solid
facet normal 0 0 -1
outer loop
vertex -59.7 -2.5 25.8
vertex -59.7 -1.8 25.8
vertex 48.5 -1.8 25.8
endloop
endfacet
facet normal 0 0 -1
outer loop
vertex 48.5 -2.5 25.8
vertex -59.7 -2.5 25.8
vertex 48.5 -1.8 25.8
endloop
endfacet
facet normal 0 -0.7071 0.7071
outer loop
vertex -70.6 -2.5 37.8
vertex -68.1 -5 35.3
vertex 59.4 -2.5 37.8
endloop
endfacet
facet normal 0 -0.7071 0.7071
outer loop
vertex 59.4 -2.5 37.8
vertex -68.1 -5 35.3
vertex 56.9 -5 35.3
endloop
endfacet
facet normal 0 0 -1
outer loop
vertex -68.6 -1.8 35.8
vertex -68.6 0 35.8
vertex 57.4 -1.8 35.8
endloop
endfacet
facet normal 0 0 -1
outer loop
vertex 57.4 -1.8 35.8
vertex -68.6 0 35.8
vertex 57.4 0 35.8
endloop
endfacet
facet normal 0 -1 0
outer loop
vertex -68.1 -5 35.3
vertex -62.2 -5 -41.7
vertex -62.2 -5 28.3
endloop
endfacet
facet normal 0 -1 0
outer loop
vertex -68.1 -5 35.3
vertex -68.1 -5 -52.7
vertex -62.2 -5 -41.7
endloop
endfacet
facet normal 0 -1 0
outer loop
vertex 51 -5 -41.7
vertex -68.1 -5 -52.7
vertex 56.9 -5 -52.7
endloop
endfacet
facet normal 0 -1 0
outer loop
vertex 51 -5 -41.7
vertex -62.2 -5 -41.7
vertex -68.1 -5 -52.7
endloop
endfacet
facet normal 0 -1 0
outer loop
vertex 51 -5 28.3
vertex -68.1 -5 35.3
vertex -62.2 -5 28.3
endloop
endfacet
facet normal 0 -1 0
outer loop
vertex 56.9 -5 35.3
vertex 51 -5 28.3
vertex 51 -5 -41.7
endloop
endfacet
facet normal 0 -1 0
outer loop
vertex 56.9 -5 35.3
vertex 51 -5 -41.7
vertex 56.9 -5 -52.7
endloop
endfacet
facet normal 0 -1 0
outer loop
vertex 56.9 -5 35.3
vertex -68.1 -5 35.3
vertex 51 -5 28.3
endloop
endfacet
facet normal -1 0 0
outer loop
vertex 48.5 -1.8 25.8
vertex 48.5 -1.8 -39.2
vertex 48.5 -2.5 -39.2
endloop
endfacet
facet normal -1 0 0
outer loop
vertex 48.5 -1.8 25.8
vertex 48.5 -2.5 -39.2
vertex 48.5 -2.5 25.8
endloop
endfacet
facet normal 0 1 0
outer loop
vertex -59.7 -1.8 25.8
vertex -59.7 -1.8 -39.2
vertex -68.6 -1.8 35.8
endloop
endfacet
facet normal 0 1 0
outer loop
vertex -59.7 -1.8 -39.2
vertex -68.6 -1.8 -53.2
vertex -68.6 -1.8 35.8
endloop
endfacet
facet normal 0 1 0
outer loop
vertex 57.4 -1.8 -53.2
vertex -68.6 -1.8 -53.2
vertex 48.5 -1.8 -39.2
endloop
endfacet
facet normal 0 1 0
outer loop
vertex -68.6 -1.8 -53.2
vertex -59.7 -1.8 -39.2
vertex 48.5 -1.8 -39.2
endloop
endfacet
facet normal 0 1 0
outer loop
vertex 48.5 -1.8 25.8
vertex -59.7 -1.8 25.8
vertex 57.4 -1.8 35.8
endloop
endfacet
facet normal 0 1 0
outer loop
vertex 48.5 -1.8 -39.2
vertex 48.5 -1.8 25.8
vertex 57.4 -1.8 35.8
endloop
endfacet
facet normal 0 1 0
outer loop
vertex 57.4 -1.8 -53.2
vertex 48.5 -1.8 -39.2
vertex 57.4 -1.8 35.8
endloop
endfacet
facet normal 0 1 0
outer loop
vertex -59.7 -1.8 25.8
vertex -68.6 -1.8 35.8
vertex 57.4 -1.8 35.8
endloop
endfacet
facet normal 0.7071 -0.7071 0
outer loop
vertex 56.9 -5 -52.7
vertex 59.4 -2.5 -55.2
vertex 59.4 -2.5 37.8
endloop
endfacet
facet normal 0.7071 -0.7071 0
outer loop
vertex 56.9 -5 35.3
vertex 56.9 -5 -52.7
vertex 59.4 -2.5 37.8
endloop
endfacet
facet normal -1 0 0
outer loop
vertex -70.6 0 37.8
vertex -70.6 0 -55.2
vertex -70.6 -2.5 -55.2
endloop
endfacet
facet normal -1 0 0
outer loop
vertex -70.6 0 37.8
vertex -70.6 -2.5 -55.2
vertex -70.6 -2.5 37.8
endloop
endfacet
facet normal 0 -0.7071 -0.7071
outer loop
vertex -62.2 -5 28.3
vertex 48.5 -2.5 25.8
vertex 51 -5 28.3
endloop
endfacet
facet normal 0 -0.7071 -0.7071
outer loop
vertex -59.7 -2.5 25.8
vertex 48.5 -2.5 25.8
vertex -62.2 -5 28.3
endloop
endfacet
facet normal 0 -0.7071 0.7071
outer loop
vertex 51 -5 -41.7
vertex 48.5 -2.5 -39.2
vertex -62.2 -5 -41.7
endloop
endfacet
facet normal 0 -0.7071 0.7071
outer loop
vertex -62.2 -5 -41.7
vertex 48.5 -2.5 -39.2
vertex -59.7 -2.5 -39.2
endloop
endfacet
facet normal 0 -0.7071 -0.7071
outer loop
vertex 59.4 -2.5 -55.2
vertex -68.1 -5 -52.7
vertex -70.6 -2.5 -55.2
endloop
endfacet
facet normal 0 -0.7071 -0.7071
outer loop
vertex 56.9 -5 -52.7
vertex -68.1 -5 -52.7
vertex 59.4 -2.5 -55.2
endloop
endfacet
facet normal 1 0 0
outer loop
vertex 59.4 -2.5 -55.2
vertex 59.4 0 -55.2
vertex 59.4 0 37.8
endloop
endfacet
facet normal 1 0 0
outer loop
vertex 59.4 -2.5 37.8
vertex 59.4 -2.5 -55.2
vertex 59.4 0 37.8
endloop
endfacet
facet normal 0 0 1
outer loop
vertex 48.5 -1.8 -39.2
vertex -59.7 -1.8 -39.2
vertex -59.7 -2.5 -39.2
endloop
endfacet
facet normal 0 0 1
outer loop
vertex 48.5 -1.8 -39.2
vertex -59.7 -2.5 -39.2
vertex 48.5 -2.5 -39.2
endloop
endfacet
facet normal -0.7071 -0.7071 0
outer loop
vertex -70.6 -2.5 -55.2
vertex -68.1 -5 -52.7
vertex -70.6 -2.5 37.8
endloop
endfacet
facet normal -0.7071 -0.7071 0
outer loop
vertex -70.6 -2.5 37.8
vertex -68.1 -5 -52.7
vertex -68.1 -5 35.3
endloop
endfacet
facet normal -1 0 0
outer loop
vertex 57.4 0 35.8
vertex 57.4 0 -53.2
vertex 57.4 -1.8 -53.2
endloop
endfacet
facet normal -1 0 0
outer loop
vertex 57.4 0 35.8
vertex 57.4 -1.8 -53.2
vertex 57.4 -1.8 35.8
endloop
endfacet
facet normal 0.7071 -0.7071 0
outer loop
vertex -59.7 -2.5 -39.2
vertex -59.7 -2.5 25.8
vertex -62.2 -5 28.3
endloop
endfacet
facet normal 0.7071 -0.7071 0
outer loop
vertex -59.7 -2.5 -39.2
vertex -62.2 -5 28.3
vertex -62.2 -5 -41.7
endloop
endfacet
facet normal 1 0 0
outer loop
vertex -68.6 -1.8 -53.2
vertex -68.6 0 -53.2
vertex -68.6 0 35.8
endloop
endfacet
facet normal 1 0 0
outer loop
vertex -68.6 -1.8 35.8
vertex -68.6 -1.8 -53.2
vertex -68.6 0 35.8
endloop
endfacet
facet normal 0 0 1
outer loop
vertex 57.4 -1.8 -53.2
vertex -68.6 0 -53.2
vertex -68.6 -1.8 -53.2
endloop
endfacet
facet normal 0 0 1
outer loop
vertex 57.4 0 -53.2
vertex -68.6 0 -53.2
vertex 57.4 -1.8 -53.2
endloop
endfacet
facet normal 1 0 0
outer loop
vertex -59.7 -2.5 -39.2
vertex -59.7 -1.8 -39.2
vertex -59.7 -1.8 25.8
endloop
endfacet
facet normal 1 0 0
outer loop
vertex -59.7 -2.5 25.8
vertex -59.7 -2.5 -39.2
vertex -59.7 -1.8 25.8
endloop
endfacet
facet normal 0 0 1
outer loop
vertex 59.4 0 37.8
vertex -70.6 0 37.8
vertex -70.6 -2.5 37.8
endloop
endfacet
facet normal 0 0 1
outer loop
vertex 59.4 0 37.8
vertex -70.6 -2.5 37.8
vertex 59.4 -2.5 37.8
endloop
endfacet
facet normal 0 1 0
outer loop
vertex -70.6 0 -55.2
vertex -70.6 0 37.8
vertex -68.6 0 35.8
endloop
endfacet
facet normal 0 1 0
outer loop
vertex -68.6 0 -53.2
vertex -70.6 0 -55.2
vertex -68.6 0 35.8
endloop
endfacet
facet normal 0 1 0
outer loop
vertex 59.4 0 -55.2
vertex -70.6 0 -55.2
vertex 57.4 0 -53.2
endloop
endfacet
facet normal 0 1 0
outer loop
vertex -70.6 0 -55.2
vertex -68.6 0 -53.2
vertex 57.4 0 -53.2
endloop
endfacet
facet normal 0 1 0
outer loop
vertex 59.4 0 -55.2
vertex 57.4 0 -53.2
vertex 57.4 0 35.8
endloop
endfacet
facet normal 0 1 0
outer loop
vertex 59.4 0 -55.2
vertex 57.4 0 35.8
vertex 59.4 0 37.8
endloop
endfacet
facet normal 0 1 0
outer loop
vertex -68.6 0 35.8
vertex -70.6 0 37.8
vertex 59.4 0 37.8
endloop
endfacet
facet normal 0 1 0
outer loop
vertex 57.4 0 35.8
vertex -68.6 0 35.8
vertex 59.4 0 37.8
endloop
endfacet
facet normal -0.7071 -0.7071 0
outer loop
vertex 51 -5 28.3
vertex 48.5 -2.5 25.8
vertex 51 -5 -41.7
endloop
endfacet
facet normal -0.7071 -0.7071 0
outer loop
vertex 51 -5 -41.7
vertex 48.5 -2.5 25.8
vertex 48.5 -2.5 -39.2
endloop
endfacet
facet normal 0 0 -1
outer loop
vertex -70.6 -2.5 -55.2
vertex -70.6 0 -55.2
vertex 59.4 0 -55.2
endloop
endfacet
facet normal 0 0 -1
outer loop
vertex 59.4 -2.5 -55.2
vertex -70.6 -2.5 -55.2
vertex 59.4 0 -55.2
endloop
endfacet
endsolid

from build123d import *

# Parameters (mm, degrees)
F0_W     = 130
F0_H     = 93
F3_DEPTH = 5
F1_W     = 126
F1_H     = 89
F4_DEPTH = 1.8
F2_W     = 108.2
F2_H     = 65
F5_DEPTH = 25
F6_SIZE  = 2.5


with BuildPart() as f3:
    # F0 (on Front) → F3 (new body)
    with BuildSketch(Plane.XZ):
        with Locations((-5.6, -8.7)):
            Rectangle(F0_W, F0_H)
    extrude(amount=F3_DEPTH)

    # F1 (on face) → F4 (cut)
    with BuildSketch(Plane.XZ):
        with Locations((-5.6, -8.7)):
            Rectangle(F1_W, F1_H)
    extrude(amount=F4_DEPTH, mode=Mode.SUBTRACT)

    # F2 (on face) → F5 (cut)
    with BuildSketch(Plane.XZ):
        with Locations((-5.6, -6.7)):
            Rectangle(F2_W, F2_H)
    extrude(amount=F5_DEPTH, mode=Mode.SUBTRACT)

    # F6
    f6_edges = [f3.edges().sort_by_distance(p)[0] for p in [
        (-5.6, -5, 25.8),
        (-59.7, -5, -6.7),
        (48.5, -5, -6.7),
        (-5.6, -5, -39.2),
        (-70.6, -5, -8.7),
        (-5.6, -5, -55.2),
        (-5.6, -5, 37.8),
        (59.4, -5, -8.7),
    ]]
    chamfer(f6_edges, length=F6_SIZE)


solid = f3.part
